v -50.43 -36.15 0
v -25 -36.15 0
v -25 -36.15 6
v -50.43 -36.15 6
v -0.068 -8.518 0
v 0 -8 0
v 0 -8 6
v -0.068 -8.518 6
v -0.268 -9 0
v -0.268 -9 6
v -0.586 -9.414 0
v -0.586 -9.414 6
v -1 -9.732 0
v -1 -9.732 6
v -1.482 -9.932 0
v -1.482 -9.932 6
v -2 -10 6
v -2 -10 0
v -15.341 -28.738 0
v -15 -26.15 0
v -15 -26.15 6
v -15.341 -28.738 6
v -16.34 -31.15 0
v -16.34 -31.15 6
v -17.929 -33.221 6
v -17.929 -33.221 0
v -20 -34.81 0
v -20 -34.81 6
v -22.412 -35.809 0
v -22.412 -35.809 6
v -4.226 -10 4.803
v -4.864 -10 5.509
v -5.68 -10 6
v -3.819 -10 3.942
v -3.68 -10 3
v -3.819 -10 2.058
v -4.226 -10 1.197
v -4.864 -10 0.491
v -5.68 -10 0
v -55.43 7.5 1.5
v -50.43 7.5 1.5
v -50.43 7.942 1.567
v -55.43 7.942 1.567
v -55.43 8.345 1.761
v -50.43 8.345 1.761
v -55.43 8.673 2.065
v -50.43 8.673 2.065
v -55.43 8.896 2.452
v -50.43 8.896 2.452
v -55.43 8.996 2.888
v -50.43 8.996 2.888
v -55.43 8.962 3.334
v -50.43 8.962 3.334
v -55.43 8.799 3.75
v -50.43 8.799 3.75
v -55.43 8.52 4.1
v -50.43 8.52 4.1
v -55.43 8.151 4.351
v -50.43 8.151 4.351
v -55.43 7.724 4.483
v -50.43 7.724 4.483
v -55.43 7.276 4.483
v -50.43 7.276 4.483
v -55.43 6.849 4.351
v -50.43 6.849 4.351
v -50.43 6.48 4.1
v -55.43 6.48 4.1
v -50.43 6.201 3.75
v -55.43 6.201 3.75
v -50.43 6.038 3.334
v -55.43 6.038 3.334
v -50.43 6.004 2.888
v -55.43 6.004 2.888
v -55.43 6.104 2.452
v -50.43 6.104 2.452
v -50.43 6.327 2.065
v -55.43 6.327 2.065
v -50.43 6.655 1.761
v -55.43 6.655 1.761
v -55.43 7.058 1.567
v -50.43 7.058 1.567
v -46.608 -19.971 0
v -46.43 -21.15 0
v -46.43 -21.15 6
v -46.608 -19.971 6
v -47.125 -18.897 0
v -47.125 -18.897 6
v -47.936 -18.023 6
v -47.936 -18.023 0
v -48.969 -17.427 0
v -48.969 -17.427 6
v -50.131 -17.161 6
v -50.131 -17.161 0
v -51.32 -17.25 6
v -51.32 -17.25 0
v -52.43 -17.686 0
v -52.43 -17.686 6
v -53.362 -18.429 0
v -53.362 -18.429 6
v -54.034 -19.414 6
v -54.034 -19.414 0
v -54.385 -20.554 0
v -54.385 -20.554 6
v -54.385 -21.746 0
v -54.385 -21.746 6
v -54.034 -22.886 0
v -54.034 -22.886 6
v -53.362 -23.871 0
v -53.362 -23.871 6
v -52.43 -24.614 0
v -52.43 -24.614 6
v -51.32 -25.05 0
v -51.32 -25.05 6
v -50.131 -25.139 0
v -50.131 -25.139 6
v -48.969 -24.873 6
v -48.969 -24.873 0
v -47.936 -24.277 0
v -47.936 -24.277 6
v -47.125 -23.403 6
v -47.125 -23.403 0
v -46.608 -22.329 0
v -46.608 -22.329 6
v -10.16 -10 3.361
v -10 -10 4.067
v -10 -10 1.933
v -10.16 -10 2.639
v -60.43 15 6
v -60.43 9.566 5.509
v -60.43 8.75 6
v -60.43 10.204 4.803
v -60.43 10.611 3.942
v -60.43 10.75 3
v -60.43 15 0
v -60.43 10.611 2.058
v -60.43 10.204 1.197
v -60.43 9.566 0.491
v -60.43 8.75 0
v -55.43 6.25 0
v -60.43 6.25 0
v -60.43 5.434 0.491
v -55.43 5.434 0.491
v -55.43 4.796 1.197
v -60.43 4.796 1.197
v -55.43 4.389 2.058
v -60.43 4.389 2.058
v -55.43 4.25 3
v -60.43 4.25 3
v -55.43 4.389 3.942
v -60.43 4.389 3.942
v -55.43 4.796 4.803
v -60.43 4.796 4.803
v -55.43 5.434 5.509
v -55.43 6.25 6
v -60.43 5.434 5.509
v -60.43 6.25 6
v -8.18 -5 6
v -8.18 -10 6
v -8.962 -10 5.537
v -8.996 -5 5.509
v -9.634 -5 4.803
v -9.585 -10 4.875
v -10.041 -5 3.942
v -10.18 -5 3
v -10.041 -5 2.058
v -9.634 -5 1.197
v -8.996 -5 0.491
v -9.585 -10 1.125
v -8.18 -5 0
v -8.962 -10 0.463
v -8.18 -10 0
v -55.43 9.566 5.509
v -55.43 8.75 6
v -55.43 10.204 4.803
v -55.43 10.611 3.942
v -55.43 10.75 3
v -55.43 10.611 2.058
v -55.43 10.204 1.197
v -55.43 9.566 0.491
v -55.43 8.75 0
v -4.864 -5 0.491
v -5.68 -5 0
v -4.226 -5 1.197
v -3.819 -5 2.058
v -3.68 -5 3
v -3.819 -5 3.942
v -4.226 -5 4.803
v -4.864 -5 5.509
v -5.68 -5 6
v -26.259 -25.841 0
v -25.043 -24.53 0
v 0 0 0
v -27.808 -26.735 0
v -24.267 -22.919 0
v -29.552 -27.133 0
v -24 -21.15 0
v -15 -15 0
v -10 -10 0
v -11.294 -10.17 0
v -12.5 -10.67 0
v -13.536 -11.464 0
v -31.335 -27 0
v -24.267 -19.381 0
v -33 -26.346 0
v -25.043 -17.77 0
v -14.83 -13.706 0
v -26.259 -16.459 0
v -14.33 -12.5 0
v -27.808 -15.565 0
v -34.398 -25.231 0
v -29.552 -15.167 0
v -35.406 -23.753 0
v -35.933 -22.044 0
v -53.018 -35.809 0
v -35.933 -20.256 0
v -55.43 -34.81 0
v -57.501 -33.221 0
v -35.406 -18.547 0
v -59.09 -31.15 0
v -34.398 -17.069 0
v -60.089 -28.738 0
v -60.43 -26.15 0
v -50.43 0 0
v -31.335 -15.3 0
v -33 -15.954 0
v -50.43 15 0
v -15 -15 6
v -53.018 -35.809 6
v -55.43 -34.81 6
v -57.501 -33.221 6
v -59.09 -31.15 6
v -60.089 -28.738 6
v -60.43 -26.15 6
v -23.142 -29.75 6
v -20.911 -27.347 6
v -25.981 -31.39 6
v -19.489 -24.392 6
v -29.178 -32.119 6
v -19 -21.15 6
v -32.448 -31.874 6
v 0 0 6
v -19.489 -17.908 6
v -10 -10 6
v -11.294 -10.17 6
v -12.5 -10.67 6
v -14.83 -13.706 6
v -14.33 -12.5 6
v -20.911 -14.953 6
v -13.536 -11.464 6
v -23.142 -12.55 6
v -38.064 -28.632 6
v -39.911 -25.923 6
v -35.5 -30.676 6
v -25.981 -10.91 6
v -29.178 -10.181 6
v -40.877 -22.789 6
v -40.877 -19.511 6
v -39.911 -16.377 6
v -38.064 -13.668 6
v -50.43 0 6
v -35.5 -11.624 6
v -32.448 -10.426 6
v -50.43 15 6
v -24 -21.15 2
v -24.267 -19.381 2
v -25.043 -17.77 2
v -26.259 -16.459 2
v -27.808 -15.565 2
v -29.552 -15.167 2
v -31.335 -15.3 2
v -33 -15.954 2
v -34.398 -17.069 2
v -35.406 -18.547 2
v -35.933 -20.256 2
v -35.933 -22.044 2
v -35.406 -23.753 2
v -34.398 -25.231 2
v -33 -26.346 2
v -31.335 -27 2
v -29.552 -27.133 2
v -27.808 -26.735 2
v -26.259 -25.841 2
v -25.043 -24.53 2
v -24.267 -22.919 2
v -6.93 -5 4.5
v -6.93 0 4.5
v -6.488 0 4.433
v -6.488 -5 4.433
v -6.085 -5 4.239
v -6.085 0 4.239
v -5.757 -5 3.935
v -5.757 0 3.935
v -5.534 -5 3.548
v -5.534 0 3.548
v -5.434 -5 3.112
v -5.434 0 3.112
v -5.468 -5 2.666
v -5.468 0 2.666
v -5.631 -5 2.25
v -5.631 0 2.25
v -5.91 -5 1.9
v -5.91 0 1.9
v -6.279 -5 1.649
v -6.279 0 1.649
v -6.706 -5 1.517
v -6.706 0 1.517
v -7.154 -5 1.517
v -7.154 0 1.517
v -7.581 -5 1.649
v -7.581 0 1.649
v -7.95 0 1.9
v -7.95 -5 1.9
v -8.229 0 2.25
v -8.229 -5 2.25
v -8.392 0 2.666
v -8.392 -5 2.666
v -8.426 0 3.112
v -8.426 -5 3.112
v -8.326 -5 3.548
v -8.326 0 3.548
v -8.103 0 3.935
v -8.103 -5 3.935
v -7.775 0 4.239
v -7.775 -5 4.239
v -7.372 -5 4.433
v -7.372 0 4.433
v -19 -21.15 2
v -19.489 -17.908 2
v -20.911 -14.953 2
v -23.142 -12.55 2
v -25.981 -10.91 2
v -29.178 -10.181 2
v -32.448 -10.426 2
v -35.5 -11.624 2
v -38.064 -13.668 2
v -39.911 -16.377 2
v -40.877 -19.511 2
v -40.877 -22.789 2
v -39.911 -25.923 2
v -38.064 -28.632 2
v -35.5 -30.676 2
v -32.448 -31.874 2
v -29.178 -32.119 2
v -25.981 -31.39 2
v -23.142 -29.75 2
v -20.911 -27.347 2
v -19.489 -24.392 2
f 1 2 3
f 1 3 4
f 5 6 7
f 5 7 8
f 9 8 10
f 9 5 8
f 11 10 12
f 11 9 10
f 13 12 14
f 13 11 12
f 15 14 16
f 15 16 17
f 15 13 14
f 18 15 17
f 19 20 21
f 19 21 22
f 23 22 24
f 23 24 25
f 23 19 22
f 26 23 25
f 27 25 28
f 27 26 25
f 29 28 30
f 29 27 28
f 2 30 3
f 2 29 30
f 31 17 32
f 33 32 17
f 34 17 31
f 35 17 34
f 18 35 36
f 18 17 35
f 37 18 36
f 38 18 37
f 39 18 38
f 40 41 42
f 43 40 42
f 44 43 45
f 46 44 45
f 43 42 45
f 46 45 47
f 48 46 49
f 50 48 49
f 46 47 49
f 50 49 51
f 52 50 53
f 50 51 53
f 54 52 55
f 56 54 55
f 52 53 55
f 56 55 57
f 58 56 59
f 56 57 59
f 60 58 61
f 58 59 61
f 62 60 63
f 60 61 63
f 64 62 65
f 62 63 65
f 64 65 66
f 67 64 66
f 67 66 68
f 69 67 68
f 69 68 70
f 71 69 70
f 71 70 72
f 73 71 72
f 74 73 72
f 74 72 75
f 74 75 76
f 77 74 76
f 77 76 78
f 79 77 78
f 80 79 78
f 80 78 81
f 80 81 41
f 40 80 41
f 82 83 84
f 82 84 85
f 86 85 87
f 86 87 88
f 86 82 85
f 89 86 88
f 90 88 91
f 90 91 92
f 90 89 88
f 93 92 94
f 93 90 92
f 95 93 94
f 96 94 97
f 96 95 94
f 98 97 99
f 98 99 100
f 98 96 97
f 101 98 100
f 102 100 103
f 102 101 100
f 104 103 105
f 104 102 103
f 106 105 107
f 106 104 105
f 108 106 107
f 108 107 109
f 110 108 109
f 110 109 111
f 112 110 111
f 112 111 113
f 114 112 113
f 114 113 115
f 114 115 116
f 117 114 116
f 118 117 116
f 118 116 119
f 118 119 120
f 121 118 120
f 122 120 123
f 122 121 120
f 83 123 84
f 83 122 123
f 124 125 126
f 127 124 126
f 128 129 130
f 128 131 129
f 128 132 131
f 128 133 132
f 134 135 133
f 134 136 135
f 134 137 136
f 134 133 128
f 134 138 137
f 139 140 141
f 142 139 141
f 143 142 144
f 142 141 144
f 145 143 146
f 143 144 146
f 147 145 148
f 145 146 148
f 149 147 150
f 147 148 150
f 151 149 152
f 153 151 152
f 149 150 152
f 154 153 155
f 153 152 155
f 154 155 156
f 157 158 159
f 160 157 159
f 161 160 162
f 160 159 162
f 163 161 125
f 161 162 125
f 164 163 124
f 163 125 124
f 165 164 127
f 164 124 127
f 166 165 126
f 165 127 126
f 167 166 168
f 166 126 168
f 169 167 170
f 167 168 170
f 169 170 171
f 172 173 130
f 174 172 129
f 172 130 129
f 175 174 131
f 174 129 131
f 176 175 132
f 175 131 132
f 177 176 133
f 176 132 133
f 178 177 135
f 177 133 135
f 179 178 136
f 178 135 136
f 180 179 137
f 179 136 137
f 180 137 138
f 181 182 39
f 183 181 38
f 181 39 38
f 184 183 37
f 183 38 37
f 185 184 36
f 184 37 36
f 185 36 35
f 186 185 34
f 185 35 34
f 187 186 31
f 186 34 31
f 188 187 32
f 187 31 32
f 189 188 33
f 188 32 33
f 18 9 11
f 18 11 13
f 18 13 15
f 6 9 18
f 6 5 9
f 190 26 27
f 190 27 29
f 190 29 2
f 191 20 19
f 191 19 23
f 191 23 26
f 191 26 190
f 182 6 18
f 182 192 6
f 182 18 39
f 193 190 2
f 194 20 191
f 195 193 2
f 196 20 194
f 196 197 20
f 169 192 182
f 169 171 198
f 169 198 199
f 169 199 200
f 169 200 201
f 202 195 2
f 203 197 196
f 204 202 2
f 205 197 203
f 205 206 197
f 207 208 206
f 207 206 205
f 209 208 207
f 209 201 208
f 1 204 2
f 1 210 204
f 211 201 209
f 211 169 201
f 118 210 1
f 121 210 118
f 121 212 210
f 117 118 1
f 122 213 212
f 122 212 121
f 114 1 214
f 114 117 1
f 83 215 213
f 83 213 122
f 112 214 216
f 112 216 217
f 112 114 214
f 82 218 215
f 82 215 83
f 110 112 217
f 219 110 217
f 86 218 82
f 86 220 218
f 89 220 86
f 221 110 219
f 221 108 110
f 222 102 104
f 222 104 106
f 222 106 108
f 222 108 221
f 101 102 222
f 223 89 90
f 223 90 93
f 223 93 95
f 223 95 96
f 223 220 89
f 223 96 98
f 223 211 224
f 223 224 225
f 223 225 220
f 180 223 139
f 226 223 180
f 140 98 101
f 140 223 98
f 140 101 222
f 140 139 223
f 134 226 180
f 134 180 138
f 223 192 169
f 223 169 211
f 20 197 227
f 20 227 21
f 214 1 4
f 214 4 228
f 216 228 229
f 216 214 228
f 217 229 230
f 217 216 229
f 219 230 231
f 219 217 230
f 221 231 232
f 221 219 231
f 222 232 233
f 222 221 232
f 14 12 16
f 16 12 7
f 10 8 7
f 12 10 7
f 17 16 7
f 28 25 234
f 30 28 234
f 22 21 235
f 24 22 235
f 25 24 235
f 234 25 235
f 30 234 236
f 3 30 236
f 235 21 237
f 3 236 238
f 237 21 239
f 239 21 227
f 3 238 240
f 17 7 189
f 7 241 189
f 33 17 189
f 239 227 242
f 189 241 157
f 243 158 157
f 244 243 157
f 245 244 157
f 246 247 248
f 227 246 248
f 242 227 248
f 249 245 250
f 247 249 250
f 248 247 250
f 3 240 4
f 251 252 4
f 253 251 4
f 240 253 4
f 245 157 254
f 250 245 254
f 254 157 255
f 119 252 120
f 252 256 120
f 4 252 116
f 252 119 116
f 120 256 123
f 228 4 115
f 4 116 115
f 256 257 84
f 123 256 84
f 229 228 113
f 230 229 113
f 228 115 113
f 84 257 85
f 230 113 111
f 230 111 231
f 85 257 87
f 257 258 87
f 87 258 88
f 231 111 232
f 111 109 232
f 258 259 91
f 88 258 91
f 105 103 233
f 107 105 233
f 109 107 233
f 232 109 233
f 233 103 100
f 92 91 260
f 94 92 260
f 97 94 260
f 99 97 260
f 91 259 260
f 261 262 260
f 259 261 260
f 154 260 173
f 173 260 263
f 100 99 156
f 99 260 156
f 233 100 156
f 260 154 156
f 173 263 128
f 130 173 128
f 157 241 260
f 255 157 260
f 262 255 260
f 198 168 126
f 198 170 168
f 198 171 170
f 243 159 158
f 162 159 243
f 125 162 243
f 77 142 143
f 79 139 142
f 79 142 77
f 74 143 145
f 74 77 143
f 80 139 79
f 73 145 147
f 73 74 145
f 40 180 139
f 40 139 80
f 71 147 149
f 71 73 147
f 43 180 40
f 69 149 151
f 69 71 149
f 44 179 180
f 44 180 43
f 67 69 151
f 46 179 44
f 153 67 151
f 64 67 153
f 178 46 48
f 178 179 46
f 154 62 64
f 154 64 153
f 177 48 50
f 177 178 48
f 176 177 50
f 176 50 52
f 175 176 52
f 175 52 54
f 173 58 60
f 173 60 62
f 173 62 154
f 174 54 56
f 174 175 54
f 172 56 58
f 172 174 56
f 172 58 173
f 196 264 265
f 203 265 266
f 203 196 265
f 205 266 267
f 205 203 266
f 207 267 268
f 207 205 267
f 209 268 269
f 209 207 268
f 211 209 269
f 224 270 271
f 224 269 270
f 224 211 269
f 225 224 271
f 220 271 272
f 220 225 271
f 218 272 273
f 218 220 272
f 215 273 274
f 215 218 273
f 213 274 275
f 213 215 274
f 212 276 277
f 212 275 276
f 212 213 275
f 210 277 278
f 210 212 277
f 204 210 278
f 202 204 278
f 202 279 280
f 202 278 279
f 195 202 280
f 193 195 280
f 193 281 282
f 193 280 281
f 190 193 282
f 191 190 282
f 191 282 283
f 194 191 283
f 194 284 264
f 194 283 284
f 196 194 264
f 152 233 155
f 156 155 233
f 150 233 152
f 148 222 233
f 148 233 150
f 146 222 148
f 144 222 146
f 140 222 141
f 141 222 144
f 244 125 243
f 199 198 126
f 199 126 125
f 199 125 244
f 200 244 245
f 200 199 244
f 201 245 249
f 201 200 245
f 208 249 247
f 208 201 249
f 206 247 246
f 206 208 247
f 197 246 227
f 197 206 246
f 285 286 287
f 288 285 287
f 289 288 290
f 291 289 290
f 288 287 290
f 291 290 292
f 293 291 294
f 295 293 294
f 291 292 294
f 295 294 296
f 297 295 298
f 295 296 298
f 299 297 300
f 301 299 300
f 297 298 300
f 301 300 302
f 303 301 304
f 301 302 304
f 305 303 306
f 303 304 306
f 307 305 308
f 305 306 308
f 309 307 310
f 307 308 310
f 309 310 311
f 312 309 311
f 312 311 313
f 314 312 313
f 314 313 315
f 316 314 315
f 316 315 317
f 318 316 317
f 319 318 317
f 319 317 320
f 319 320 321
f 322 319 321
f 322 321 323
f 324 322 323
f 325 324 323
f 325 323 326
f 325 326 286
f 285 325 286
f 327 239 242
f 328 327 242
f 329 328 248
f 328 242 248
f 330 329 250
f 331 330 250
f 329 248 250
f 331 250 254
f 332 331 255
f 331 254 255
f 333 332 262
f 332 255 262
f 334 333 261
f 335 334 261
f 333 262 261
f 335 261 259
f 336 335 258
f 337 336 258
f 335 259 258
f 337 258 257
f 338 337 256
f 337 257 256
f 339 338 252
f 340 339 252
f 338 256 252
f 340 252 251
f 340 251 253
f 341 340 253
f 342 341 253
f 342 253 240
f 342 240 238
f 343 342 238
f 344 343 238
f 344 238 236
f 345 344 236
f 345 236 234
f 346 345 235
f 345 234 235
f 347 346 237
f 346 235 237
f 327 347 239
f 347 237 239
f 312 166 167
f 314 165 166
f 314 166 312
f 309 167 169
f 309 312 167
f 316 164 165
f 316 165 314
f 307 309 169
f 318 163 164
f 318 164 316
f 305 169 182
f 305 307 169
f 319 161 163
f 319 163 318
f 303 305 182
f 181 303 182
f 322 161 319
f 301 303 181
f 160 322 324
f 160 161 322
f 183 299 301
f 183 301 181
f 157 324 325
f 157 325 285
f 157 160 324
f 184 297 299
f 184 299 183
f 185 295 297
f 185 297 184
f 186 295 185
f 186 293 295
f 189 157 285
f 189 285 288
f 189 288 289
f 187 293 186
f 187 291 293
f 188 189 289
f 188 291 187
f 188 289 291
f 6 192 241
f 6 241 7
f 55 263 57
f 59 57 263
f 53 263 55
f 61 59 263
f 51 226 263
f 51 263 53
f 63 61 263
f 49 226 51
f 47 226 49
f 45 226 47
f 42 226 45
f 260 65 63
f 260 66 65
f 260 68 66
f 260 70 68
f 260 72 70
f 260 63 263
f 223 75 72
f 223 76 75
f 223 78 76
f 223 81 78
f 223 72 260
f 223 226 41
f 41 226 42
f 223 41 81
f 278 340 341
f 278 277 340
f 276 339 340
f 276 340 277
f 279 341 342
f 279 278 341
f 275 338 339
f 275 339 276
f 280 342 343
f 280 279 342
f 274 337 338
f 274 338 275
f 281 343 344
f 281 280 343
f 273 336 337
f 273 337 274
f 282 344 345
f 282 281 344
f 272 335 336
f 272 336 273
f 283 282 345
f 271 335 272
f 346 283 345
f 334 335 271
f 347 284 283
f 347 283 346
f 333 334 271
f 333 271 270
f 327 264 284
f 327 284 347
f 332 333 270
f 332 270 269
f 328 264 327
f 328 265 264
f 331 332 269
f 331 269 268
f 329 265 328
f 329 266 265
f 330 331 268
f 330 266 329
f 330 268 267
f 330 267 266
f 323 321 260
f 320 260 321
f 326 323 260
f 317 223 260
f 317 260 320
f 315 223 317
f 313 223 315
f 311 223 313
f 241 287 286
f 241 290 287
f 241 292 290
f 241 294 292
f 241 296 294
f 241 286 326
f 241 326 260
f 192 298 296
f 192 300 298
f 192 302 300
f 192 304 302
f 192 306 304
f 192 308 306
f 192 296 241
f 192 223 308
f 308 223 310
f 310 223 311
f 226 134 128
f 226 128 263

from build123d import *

# Parameters (mm, degrees)
CROQUIS1_R              = 4
CROQUIS1_R_2            = 6
SALIENTE_EXTRUIR2_DEPTH = 6
CROQUIS2_R              = 11
CORTAR_EXTRUIR1_DEPTH   = 4
CROQUIS3_R              = 1.5
CORTAR_EXTRUIR2_DEPTH   = 71.672536391
CROQUIS4_R              = 1.5
CORTAR_EXTRUIR3_DEPTH   = 63.337848856
CROQUIS5_R              = 3.25
CORTAR_EXTRUIR4_DEPTH   = 5
CROQUIS6_R              = 3.25
CORTAR_EXTRUIR5_DEPTH   = 5


with BuildPart() as part:
    # Croquis1 → Saliente-Extruir2 (new body)
    with BuildSketch(Plane.XY):
        with BuildLine():
            Line((-50.43, 0), (0, 0))
            Line((0, 0), (0, -8))
            ThreePointArc((0, -8), (-0.585786438, -9.414213562), (-2, -10))
            Line((-2, -10), (-10, -10))
            ThreePointArc((-10, -10), (-13.535533906, -11.464466094), (-15, -15))
            Line((-15, -15), (-15, -26.15))
            ThreePointArc((-15, -26.15), (-17.928932188, -33.221067812), (-25, -36.15))
            Line((-25, -36.15), (-50.43, -36.15))
            ThreePointArc((-50.43, -36.15), (-57.501067812, -33.221067812), (-60.43, -26.15))
            Line((-60.43, -26.15), (-60.43, 15))
            Line((-60.43, 15), (-50.43, 15))
            Line((-50.43, 15), (-50.43, 0))
        make_face()
        with Locations((-50.43, -21.15)):
            Circle(CROQUIS1_R, mode=Mode.SUBTRACT)
        with Locations((-30, -21.15)):
            Circle(CROQUIS1_R_2, mode=Mode.SUBTRACT)
    extrude(amount=SALIENTE_EXTRUIR2_DEPTH)

    # Croquis2 → Cortar-Extruir1 (cut)
    with BuildSketch(Plane.XY.offset(6)):
        with Locations((-30, -21.15)):
            Circle(CROQUIS2_R)
    extrude(amount=-CORTAR_EXTRUIR1_DEPTH, mode=Mode.SUBTRACT)

    # Croquis3 → Cortar-Extruir2 (cut, through all)
    with BuildSketch(Plane(origin=(0, 0, 0), x_dir=(-1, 0, 0), z_dir=(0, 1, 0))):
        with Locations(Location((6.93, 3, 0), (0, 0, 90))):
            Circle(CROQUIS3_R)
    extrude(amount=-CORTAR_EXTRUIR2_DEPTH, mode=Mode.SUBTRACT)

    # Croquis4 → Cortar-Extruir3 (cut, through all)
    with BuildSketch(Plane(origin=(-50.43, 0, 0), x_dir=(0, 0, -1), z_dir=(1, 0, 0))):
        with Locations((-3, 7.5)):
            Circle(CROQUIS4_R)
    extrude(amount=-CORTAR_EXTRUIR3_DEPTH, mode=Mode.SUBTRACT)

    # Croquis5 → Cortar-Extruir4 (cut)
    with BuildSketch(Plane.ZY.offset(60.43)):
        with Locations((3, 7.5)):
            Circle(CROQUIS5_R)
    extrude(amount=-CORTAR_EXTRUIR4_DEPTH, mode=Mode.SUBTRACT)

    # Croquis6 → Cortar-Extruir5 (cut)
    with BuildSketch(Plane.XZ.offset(10)):
        with Locations((-6.93, 3)):
            Circle(CROQUIS6_R)
    extrude(amount=-CORTAR_EXTRUIR5_DEPTH, mode=Mode.SUBTRACT)


solid = part.part
